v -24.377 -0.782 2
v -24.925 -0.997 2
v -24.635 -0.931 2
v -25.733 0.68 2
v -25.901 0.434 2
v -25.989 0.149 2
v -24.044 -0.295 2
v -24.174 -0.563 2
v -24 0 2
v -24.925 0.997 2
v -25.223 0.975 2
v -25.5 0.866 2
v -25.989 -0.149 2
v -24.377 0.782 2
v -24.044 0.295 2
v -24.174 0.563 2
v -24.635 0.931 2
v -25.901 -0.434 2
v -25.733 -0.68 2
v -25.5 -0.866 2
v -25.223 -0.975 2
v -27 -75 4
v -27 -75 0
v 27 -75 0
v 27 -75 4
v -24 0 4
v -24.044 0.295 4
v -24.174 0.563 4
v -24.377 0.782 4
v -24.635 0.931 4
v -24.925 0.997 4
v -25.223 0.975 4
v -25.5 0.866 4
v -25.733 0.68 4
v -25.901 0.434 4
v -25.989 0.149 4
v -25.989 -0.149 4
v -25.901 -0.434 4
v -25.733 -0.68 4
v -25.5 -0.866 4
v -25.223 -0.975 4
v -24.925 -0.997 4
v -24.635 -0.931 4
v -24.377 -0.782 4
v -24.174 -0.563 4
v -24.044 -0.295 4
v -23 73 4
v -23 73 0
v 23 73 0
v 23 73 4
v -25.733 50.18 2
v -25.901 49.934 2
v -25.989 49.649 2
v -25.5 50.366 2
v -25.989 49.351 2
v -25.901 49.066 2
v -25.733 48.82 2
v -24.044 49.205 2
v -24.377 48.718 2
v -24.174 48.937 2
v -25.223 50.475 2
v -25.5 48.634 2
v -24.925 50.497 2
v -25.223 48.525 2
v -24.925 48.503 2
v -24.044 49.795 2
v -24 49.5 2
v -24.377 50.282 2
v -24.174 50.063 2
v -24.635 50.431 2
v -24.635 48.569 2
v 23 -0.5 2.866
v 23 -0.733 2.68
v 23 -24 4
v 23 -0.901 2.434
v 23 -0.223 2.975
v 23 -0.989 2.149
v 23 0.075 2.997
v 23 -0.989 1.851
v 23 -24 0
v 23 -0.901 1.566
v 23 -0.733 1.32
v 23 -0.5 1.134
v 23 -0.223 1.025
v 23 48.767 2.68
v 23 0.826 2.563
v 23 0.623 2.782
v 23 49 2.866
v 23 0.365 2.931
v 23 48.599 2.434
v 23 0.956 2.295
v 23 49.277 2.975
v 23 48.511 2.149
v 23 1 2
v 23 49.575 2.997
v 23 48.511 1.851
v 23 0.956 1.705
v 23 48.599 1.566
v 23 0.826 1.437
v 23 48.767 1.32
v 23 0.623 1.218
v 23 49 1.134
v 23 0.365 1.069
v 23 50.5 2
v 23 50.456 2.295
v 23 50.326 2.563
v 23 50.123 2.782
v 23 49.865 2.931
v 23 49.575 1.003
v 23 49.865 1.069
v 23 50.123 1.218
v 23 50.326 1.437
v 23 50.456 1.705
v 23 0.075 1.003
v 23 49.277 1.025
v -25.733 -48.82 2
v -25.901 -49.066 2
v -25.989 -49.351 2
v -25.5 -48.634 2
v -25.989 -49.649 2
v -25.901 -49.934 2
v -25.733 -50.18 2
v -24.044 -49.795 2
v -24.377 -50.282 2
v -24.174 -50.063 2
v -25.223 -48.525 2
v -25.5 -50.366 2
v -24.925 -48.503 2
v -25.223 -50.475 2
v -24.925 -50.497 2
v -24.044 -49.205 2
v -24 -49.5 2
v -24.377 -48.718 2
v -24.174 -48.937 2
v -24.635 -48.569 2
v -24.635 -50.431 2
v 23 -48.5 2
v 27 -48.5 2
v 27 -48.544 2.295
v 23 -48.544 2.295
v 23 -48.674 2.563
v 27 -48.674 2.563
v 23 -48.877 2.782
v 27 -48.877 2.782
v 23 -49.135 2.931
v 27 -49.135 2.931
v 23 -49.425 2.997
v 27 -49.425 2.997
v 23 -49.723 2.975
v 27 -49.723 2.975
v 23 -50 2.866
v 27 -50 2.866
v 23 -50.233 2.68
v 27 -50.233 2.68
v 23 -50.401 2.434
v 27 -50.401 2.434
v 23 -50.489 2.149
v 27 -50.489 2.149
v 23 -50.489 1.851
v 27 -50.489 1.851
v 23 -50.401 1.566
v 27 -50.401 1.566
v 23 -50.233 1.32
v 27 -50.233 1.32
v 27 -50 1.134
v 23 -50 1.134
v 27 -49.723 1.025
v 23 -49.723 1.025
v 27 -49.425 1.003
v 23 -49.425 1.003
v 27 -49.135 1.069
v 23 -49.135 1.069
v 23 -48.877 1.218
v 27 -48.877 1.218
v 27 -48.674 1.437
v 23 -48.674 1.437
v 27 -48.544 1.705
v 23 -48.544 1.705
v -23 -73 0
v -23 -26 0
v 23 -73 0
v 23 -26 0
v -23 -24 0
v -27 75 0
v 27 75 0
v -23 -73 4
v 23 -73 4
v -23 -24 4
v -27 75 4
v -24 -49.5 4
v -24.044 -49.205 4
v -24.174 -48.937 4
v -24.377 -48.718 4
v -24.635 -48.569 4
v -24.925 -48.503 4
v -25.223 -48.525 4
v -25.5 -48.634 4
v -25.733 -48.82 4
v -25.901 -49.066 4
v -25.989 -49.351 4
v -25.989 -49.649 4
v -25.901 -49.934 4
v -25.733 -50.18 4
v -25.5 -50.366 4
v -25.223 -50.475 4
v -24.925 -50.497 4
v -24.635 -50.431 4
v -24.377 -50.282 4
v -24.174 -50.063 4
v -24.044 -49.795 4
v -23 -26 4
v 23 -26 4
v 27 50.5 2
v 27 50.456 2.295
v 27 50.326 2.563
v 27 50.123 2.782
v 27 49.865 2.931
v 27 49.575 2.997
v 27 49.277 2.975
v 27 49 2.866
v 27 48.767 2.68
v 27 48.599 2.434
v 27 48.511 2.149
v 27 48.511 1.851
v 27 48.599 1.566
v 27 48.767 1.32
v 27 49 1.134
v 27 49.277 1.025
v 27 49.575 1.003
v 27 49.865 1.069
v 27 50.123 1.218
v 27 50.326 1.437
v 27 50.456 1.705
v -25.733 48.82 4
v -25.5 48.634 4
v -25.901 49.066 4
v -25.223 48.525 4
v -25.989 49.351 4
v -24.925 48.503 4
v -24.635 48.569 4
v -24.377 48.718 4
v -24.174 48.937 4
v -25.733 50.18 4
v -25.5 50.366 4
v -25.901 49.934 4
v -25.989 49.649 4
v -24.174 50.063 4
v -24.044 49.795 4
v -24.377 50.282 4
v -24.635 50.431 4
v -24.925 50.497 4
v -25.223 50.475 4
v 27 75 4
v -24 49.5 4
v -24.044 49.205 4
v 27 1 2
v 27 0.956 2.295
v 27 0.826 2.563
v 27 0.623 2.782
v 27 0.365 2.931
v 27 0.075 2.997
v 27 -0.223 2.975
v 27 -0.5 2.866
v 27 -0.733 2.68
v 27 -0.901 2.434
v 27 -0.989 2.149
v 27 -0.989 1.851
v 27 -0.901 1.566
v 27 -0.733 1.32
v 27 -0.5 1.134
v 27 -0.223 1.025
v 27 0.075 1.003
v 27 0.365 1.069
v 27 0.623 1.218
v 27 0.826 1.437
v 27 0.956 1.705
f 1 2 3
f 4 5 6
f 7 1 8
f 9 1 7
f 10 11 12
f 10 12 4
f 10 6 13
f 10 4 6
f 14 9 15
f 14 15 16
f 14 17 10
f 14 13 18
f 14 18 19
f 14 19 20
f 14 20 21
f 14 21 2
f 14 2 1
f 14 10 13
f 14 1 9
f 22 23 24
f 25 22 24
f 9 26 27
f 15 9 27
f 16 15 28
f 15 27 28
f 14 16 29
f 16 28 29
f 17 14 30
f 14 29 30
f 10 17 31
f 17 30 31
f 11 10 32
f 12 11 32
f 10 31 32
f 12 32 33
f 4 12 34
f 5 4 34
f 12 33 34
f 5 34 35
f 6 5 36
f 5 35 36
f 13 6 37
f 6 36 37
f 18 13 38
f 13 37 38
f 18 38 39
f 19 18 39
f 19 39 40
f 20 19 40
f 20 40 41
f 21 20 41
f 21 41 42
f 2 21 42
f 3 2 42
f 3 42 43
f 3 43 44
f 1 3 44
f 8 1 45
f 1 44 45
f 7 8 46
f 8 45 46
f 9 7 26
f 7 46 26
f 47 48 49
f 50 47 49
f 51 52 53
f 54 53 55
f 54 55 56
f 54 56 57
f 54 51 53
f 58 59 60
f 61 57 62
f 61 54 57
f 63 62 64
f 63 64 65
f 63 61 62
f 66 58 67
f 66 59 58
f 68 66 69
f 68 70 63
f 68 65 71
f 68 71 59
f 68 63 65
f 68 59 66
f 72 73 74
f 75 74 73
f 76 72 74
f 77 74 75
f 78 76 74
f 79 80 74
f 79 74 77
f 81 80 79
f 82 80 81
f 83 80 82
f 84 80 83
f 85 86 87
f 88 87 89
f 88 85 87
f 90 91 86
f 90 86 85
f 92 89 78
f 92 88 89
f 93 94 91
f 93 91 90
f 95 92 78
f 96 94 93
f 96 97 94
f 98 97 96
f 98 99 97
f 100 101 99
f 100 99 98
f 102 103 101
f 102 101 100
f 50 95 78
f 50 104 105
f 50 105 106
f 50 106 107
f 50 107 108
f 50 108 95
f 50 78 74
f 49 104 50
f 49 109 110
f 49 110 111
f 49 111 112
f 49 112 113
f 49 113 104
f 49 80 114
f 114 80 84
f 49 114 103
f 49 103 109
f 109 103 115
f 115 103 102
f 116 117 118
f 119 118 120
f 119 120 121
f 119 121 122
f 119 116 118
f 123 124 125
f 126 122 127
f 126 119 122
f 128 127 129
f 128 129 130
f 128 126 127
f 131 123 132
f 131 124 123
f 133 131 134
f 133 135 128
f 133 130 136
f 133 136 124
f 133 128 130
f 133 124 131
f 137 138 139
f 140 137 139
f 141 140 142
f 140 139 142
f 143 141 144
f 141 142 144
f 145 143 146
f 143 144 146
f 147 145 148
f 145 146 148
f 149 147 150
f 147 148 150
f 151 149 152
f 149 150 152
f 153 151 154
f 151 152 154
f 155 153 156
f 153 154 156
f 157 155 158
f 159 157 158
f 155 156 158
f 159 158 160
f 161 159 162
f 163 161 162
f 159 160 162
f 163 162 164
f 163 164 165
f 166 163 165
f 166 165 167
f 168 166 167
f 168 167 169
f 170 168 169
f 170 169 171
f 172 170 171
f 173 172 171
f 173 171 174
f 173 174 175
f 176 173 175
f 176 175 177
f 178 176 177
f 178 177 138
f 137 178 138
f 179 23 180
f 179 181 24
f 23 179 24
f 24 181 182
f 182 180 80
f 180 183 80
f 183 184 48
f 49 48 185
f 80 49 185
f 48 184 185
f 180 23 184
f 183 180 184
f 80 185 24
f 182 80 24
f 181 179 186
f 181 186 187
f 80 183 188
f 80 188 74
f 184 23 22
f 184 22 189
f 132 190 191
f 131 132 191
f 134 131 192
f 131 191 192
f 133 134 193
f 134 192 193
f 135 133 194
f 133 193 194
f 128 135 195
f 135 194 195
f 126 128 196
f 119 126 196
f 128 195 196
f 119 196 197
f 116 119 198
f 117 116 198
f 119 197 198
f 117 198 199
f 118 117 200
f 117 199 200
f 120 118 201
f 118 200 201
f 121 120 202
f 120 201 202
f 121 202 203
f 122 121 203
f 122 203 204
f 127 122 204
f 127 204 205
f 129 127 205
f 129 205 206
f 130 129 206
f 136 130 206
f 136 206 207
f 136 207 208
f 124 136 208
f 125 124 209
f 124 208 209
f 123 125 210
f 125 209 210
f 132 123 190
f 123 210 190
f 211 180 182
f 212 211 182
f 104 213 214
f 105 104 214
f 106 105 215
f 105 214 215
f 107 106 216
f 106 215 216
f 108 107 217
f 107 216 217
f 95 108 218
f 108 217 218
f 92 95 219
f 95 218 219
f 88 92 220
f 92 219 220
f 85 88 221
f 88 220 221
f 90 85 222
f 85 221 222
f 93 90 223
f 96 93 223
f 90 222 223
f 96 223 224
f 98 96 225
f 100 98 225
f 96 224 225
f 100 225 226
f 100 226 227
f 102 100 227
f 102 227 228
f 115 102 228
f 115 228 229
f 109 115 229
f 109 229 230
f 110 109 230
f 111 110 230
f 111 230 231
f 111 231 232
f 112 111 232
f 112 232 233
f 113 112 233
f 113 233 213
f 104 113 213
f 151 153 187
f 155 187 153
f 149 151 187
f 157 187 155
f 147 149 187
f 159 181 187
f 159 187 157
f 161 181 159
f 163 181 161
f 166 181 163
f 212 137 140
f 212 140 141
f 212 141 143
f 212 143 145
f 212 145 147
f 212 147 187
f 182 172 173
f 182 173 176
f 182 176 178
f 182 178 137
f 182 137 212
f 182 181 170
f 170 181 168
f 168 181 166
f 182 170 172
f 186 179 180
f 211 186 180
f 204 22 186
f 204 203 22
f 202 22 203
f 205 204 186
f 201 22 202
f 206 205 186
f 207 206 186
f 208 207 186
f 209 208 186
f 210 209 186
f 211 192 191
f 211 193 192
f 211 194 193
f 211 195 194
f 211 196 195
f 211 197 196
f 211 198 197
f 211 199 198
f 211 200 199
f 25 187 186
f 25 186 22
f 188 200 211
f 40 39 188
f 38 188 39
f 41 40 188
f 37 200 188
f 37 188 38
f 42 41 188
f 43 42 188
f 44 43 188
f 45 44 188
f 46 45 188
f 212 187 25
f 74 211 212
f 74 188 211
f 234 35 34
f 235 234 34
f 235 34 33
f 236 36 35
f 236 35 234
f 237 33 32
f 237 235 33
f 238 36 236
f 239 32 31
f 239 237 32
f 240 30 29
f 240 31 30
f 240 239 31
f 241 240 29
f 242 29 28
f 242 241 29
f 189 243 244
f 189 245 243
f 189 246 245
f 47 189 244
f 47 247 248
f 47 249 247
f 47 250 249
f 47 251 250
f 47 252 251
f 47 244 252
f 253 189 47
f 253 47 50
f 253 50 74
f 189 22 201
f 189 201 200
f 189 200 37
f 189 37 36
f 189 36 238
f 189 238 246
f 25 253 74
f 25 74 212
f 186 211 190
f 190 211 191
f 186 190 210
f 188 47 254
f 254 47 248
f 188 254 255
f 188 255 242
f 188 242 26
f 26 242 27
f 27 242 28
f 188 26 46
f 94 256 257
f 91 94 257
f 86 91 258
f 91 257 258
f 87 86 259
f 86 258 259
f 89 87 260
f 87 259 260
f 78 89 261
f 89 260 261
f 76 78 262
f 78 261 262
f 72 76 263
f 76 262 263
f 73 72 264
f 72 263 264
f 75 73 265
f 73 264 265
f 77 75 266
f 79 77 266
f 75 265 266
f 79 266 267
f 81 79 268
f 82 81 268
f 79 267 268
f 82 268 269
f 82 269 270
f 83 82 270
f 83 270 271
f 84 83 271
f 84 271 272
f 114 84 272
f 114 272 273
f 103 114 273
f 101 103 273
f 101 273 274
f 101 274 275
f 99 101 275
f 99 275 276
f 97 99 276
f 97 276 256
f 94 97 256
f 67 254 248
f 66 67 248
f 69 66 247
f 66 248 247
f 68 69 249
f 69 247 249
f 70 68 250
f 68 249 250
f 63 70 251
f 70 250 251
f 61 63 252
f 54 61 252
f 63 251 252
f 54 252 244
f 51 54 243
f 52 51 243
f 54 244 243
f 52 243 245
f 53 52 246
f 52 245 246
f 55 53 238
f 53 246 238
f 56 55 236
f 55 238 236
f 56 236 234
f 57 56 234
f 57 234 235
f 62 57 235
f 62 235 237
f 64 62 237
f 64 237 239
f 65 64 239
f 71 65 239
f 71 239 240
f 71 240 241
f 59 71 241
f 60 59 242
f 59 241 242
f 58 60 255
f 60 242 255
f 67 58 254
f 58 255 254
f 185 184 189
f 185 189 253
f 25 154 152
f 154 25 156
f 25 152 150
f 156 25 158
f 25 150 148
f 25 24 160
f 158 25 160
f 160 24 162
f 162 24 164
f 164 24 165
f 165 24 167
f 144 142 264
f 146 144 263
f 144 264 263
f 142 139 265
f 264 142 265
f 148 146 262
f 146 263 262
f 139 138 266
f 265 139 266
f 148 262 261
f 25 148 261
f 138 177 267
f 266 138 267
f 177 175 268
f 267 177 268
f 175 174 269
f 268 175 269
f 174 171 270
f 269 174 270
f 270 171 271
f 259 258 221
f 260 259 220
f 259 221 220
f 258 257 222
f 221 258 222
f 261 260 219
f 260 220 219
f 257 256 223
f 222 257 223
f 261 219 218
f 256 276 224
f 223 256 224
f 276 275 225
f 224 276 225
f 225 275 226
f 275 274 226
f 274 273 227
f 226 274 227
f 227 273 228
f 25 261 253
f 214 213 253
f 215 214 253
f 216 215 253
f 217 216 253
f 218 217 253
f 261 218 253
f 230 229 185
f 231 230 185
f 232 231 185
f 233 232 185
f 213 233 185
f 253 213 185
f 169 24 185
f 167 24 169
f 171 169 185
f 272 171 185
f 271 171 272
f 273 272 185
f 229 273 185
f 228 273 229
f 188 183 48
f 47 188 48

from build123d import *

# Parameters (mm, degrees)
F0_W     = 54
F0_H     = 150
F0_W_2   = 46
F0_H_2   = 47
F0_H_3   = 97
F1_DEPTH = 4
F2_R     = 1
F3_DEPTH = 25
F4_R     = 1
F5_DEPTH = 2


with BuildPart() as f1:
    # F0 (on Top) → F1 (new body)
    with BuildSketch(Plane.XY):
        Rectangle(F0_W, F0_H)
        with Locations((0, -49.5)):
            Rectangle(F0_W_2, F0_H_2, mode=Mode.SUBTRACT)
        with Locations((0, 24.5)):
            Rectangle(F0_W_2, F0_H_3, mode=Mode.SUBTRACT)
    extrude(amount=F1_DEPTH)

    # F2 (on face) → F3 (cut)
    with BuildSketch(Plane.YZ.offset(27)):
        with Locations((-49.5, 2)):
            Circle(F2_R)
        with Locations((0, 2)):
            Circle(F2_R)
        with Locations((49.5, 2)):
            Circle(F2_R)
    extrude(amount=-F3_DEPTH, mode=Mode.SUBTRACT)

    # F4 (on face) → F5 (cut)
    with BuildSketch(Plane.XY.offset(4)):
        with Locations((-25, -49.5)):
            Circle(F4_R)
        with Locations((-25, 0)):
            Circle(F4_R)
        with Locations((-25, 49.5)):
            Circle(F4_R)
    extrude(amount=-F5_DEPTH, mode=Mode.SUBTRACT)


solid = f1.part
